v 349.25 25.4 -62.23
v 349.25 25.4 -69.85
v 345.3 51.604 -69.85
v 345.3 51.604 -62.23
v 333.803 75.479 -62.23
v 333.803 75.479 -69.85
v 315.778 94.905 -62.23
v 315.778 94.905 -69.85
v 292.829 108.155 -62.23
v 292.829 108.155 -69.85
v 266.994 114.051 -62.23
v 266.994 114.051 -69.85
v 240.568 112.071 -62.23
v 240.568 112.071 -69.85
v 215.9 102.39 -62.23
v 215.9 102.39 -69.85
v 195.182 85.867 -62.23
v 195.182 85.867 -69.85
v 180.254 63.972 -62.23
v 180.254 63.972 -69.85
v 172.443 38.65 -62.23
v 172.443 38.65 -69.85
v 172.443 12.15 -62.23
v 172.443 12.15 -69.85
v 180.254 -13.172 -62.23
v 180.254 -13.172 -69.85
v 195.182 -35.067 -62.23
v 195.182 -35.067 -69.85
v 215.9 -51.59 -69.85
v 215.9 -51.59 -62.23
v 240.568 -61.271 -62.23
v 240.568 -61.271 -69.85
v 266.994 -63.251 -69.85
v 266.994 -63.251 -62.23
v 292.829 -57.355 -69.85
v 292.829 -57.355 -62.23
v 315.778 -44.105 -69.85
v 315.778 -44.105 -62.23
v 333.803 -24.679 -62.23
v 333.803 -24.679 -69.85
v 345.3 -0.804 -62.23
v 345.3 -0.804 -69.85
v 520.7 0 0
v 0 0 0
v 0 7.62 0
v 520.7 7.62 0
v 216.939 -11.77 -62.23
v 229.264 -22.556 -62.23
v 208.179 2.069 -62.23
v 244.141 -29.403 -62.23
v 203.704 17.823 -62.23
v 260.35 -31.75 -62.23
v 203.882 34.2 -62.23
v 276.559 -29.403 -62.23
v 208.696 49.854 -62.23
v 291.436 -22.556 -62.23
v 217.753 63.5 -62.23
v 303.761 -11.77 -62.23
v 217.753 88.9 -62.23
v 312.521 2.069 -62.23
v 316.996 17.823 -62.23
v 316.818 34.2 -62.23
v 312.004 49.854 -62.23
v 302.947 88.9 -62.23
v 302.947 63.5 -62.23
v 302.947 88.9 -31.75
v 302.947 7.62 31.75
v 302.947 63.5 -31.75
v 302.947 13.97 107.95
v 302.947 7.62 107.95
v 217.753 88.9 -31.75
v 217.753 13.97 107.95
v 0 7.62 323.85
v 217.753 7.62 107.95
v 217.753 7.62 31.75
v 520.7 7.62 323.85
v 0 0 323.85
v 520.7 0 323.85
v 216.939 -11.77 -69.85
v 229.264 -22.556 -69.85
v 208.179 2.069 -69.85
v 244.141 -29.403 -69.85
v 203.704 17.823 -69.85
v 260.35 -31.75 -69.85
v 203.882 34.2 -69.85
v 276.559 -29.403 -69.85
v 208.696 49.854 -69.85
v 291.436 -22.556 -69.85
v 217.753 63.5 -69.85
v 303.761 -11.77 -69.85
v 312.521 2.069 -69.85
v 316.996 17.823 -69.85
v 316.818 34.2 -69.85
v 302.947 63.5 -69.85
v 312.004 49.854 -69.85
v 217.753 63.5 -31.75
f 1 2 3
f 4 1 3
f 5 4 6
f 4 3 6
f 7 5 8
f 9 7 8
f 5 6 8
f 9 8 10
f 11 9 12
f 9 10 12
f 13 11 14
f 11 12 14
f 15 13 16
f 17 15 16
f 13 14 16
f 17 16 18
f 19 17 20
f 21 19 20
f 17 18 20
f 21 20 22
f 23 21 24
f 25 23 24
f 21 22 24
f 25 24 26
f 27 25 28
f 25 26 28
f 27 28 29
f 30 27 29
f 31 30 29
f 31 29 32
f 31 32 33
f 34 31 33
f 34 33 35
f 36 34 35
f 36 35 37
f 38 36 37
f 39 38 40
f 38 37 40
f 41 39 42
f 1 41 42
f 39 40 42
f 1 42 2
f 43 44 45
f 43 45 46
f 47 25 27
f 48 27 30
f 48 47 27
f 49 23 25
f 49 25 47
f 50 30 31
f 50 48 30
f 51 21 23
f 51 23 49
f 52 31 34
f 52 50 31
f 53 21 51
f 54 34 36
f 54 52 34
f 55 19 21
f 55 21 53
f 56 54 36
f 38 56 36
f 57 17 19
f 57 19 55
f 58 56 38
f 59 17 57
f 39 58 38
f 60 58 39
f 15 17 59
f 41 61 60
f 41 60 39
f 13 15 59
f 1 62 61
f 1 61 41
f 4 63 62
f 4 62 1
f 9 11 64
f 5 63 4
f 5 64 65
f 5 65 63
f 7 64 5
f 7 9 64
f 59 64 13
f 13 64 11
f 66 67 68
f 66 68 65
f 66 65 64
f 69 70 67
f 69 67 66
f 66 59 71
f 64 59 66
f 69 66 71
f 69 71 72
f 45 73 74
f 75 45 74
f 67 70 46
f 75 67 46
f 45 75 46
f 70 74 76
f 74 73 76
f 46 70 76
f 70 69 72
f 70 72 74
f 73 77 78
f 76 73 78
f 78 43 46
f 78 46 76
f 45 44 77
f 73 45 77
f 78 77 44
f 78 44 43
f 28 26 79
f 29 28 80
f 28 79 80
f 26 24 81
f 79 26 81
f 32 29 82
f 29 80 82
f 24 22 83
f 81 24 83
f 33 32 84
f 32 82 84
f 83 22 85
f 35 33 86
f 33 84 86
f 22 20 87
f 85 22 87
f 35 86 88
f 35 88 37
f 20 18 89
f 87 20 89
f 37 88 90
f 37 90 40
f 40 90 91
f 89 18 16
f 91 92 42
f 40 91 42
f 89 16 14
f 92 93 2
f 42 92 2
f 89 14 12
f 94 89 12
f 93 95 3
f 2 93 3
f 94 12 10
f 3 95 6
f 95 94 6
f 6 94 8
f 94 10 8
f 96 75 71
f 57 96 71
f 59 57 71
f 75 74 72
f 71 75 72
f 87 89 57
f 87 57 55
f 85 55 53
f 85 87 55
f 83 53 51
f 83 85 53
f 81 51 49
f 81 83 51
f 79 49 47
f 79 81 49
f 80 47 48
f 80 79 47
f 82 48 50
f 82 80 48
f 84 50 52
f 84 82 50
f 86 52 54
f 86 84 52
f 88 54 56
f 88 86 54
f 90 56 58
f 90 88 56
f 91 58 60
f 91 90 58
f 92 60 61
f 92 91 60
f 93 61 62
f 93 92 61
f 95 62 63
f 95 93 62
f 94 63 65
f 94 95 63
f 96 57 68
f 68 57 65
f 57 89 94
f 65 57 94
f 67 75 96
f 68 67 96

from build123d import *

# Parameters (mm, degrees)
F0_W     = 520.7
F0_H     = 323.85
F1_DEPTH = 7.62
F3_R     = 88.9
F3_R_2   = 57.15
F4_DEPTH = 7.62
F5_W     = 85.19419
F5_H     = 25.4
F6_DEPTH = 38.1
F8_DEPTH = 85.19419


with BuildPart() as f1:
    # F0 (on Front) → F1 (new body)
    with BuildSketch(Plane.XZ):
        with Locations((260.35, 161.925)):
            Rectangle(F0_W, F0_H)
    extrude(amount=-F1_DEPTH)



with BuildPart() as f4:
    # F3 (on offset) → F4 (new body)
    with BuildSketch(Plane.XY.offset(-69.85)):
        with Locations((260.35, 25.4)):
            Circle(F3_R)
        with Locations((260.35, 25.4)):
            Circle(F3_R_2, mode=Mode.SUBTRACT)
    extrude(amount=F4_DEPTH)

    # F5 (on offset) → F6 (join)
    with BuildSketch(Plane.XY.offset(-69.85)):
        with Locations((260.35, 76.2)):
            Rectangle(F5_W, F5_H)
    extrude(amount=F6_DEPTH)


with BuildPart() as f1_1:
    add(f1.part)

    add(f4.part)  # F8 merges F4
    # F7 (on face) → F8 (join, through all)
    with BuildSketch(Plane.YZ.offset(302.947095)):
        Polygon((7.62, 31.75), (63.5, -31.75), (88.9, -31.75), (13.97, 107.95), (7.62, 107.95), align=None)
    extrude(amount=-F8_DEPTH)


solid = f1_1.part
